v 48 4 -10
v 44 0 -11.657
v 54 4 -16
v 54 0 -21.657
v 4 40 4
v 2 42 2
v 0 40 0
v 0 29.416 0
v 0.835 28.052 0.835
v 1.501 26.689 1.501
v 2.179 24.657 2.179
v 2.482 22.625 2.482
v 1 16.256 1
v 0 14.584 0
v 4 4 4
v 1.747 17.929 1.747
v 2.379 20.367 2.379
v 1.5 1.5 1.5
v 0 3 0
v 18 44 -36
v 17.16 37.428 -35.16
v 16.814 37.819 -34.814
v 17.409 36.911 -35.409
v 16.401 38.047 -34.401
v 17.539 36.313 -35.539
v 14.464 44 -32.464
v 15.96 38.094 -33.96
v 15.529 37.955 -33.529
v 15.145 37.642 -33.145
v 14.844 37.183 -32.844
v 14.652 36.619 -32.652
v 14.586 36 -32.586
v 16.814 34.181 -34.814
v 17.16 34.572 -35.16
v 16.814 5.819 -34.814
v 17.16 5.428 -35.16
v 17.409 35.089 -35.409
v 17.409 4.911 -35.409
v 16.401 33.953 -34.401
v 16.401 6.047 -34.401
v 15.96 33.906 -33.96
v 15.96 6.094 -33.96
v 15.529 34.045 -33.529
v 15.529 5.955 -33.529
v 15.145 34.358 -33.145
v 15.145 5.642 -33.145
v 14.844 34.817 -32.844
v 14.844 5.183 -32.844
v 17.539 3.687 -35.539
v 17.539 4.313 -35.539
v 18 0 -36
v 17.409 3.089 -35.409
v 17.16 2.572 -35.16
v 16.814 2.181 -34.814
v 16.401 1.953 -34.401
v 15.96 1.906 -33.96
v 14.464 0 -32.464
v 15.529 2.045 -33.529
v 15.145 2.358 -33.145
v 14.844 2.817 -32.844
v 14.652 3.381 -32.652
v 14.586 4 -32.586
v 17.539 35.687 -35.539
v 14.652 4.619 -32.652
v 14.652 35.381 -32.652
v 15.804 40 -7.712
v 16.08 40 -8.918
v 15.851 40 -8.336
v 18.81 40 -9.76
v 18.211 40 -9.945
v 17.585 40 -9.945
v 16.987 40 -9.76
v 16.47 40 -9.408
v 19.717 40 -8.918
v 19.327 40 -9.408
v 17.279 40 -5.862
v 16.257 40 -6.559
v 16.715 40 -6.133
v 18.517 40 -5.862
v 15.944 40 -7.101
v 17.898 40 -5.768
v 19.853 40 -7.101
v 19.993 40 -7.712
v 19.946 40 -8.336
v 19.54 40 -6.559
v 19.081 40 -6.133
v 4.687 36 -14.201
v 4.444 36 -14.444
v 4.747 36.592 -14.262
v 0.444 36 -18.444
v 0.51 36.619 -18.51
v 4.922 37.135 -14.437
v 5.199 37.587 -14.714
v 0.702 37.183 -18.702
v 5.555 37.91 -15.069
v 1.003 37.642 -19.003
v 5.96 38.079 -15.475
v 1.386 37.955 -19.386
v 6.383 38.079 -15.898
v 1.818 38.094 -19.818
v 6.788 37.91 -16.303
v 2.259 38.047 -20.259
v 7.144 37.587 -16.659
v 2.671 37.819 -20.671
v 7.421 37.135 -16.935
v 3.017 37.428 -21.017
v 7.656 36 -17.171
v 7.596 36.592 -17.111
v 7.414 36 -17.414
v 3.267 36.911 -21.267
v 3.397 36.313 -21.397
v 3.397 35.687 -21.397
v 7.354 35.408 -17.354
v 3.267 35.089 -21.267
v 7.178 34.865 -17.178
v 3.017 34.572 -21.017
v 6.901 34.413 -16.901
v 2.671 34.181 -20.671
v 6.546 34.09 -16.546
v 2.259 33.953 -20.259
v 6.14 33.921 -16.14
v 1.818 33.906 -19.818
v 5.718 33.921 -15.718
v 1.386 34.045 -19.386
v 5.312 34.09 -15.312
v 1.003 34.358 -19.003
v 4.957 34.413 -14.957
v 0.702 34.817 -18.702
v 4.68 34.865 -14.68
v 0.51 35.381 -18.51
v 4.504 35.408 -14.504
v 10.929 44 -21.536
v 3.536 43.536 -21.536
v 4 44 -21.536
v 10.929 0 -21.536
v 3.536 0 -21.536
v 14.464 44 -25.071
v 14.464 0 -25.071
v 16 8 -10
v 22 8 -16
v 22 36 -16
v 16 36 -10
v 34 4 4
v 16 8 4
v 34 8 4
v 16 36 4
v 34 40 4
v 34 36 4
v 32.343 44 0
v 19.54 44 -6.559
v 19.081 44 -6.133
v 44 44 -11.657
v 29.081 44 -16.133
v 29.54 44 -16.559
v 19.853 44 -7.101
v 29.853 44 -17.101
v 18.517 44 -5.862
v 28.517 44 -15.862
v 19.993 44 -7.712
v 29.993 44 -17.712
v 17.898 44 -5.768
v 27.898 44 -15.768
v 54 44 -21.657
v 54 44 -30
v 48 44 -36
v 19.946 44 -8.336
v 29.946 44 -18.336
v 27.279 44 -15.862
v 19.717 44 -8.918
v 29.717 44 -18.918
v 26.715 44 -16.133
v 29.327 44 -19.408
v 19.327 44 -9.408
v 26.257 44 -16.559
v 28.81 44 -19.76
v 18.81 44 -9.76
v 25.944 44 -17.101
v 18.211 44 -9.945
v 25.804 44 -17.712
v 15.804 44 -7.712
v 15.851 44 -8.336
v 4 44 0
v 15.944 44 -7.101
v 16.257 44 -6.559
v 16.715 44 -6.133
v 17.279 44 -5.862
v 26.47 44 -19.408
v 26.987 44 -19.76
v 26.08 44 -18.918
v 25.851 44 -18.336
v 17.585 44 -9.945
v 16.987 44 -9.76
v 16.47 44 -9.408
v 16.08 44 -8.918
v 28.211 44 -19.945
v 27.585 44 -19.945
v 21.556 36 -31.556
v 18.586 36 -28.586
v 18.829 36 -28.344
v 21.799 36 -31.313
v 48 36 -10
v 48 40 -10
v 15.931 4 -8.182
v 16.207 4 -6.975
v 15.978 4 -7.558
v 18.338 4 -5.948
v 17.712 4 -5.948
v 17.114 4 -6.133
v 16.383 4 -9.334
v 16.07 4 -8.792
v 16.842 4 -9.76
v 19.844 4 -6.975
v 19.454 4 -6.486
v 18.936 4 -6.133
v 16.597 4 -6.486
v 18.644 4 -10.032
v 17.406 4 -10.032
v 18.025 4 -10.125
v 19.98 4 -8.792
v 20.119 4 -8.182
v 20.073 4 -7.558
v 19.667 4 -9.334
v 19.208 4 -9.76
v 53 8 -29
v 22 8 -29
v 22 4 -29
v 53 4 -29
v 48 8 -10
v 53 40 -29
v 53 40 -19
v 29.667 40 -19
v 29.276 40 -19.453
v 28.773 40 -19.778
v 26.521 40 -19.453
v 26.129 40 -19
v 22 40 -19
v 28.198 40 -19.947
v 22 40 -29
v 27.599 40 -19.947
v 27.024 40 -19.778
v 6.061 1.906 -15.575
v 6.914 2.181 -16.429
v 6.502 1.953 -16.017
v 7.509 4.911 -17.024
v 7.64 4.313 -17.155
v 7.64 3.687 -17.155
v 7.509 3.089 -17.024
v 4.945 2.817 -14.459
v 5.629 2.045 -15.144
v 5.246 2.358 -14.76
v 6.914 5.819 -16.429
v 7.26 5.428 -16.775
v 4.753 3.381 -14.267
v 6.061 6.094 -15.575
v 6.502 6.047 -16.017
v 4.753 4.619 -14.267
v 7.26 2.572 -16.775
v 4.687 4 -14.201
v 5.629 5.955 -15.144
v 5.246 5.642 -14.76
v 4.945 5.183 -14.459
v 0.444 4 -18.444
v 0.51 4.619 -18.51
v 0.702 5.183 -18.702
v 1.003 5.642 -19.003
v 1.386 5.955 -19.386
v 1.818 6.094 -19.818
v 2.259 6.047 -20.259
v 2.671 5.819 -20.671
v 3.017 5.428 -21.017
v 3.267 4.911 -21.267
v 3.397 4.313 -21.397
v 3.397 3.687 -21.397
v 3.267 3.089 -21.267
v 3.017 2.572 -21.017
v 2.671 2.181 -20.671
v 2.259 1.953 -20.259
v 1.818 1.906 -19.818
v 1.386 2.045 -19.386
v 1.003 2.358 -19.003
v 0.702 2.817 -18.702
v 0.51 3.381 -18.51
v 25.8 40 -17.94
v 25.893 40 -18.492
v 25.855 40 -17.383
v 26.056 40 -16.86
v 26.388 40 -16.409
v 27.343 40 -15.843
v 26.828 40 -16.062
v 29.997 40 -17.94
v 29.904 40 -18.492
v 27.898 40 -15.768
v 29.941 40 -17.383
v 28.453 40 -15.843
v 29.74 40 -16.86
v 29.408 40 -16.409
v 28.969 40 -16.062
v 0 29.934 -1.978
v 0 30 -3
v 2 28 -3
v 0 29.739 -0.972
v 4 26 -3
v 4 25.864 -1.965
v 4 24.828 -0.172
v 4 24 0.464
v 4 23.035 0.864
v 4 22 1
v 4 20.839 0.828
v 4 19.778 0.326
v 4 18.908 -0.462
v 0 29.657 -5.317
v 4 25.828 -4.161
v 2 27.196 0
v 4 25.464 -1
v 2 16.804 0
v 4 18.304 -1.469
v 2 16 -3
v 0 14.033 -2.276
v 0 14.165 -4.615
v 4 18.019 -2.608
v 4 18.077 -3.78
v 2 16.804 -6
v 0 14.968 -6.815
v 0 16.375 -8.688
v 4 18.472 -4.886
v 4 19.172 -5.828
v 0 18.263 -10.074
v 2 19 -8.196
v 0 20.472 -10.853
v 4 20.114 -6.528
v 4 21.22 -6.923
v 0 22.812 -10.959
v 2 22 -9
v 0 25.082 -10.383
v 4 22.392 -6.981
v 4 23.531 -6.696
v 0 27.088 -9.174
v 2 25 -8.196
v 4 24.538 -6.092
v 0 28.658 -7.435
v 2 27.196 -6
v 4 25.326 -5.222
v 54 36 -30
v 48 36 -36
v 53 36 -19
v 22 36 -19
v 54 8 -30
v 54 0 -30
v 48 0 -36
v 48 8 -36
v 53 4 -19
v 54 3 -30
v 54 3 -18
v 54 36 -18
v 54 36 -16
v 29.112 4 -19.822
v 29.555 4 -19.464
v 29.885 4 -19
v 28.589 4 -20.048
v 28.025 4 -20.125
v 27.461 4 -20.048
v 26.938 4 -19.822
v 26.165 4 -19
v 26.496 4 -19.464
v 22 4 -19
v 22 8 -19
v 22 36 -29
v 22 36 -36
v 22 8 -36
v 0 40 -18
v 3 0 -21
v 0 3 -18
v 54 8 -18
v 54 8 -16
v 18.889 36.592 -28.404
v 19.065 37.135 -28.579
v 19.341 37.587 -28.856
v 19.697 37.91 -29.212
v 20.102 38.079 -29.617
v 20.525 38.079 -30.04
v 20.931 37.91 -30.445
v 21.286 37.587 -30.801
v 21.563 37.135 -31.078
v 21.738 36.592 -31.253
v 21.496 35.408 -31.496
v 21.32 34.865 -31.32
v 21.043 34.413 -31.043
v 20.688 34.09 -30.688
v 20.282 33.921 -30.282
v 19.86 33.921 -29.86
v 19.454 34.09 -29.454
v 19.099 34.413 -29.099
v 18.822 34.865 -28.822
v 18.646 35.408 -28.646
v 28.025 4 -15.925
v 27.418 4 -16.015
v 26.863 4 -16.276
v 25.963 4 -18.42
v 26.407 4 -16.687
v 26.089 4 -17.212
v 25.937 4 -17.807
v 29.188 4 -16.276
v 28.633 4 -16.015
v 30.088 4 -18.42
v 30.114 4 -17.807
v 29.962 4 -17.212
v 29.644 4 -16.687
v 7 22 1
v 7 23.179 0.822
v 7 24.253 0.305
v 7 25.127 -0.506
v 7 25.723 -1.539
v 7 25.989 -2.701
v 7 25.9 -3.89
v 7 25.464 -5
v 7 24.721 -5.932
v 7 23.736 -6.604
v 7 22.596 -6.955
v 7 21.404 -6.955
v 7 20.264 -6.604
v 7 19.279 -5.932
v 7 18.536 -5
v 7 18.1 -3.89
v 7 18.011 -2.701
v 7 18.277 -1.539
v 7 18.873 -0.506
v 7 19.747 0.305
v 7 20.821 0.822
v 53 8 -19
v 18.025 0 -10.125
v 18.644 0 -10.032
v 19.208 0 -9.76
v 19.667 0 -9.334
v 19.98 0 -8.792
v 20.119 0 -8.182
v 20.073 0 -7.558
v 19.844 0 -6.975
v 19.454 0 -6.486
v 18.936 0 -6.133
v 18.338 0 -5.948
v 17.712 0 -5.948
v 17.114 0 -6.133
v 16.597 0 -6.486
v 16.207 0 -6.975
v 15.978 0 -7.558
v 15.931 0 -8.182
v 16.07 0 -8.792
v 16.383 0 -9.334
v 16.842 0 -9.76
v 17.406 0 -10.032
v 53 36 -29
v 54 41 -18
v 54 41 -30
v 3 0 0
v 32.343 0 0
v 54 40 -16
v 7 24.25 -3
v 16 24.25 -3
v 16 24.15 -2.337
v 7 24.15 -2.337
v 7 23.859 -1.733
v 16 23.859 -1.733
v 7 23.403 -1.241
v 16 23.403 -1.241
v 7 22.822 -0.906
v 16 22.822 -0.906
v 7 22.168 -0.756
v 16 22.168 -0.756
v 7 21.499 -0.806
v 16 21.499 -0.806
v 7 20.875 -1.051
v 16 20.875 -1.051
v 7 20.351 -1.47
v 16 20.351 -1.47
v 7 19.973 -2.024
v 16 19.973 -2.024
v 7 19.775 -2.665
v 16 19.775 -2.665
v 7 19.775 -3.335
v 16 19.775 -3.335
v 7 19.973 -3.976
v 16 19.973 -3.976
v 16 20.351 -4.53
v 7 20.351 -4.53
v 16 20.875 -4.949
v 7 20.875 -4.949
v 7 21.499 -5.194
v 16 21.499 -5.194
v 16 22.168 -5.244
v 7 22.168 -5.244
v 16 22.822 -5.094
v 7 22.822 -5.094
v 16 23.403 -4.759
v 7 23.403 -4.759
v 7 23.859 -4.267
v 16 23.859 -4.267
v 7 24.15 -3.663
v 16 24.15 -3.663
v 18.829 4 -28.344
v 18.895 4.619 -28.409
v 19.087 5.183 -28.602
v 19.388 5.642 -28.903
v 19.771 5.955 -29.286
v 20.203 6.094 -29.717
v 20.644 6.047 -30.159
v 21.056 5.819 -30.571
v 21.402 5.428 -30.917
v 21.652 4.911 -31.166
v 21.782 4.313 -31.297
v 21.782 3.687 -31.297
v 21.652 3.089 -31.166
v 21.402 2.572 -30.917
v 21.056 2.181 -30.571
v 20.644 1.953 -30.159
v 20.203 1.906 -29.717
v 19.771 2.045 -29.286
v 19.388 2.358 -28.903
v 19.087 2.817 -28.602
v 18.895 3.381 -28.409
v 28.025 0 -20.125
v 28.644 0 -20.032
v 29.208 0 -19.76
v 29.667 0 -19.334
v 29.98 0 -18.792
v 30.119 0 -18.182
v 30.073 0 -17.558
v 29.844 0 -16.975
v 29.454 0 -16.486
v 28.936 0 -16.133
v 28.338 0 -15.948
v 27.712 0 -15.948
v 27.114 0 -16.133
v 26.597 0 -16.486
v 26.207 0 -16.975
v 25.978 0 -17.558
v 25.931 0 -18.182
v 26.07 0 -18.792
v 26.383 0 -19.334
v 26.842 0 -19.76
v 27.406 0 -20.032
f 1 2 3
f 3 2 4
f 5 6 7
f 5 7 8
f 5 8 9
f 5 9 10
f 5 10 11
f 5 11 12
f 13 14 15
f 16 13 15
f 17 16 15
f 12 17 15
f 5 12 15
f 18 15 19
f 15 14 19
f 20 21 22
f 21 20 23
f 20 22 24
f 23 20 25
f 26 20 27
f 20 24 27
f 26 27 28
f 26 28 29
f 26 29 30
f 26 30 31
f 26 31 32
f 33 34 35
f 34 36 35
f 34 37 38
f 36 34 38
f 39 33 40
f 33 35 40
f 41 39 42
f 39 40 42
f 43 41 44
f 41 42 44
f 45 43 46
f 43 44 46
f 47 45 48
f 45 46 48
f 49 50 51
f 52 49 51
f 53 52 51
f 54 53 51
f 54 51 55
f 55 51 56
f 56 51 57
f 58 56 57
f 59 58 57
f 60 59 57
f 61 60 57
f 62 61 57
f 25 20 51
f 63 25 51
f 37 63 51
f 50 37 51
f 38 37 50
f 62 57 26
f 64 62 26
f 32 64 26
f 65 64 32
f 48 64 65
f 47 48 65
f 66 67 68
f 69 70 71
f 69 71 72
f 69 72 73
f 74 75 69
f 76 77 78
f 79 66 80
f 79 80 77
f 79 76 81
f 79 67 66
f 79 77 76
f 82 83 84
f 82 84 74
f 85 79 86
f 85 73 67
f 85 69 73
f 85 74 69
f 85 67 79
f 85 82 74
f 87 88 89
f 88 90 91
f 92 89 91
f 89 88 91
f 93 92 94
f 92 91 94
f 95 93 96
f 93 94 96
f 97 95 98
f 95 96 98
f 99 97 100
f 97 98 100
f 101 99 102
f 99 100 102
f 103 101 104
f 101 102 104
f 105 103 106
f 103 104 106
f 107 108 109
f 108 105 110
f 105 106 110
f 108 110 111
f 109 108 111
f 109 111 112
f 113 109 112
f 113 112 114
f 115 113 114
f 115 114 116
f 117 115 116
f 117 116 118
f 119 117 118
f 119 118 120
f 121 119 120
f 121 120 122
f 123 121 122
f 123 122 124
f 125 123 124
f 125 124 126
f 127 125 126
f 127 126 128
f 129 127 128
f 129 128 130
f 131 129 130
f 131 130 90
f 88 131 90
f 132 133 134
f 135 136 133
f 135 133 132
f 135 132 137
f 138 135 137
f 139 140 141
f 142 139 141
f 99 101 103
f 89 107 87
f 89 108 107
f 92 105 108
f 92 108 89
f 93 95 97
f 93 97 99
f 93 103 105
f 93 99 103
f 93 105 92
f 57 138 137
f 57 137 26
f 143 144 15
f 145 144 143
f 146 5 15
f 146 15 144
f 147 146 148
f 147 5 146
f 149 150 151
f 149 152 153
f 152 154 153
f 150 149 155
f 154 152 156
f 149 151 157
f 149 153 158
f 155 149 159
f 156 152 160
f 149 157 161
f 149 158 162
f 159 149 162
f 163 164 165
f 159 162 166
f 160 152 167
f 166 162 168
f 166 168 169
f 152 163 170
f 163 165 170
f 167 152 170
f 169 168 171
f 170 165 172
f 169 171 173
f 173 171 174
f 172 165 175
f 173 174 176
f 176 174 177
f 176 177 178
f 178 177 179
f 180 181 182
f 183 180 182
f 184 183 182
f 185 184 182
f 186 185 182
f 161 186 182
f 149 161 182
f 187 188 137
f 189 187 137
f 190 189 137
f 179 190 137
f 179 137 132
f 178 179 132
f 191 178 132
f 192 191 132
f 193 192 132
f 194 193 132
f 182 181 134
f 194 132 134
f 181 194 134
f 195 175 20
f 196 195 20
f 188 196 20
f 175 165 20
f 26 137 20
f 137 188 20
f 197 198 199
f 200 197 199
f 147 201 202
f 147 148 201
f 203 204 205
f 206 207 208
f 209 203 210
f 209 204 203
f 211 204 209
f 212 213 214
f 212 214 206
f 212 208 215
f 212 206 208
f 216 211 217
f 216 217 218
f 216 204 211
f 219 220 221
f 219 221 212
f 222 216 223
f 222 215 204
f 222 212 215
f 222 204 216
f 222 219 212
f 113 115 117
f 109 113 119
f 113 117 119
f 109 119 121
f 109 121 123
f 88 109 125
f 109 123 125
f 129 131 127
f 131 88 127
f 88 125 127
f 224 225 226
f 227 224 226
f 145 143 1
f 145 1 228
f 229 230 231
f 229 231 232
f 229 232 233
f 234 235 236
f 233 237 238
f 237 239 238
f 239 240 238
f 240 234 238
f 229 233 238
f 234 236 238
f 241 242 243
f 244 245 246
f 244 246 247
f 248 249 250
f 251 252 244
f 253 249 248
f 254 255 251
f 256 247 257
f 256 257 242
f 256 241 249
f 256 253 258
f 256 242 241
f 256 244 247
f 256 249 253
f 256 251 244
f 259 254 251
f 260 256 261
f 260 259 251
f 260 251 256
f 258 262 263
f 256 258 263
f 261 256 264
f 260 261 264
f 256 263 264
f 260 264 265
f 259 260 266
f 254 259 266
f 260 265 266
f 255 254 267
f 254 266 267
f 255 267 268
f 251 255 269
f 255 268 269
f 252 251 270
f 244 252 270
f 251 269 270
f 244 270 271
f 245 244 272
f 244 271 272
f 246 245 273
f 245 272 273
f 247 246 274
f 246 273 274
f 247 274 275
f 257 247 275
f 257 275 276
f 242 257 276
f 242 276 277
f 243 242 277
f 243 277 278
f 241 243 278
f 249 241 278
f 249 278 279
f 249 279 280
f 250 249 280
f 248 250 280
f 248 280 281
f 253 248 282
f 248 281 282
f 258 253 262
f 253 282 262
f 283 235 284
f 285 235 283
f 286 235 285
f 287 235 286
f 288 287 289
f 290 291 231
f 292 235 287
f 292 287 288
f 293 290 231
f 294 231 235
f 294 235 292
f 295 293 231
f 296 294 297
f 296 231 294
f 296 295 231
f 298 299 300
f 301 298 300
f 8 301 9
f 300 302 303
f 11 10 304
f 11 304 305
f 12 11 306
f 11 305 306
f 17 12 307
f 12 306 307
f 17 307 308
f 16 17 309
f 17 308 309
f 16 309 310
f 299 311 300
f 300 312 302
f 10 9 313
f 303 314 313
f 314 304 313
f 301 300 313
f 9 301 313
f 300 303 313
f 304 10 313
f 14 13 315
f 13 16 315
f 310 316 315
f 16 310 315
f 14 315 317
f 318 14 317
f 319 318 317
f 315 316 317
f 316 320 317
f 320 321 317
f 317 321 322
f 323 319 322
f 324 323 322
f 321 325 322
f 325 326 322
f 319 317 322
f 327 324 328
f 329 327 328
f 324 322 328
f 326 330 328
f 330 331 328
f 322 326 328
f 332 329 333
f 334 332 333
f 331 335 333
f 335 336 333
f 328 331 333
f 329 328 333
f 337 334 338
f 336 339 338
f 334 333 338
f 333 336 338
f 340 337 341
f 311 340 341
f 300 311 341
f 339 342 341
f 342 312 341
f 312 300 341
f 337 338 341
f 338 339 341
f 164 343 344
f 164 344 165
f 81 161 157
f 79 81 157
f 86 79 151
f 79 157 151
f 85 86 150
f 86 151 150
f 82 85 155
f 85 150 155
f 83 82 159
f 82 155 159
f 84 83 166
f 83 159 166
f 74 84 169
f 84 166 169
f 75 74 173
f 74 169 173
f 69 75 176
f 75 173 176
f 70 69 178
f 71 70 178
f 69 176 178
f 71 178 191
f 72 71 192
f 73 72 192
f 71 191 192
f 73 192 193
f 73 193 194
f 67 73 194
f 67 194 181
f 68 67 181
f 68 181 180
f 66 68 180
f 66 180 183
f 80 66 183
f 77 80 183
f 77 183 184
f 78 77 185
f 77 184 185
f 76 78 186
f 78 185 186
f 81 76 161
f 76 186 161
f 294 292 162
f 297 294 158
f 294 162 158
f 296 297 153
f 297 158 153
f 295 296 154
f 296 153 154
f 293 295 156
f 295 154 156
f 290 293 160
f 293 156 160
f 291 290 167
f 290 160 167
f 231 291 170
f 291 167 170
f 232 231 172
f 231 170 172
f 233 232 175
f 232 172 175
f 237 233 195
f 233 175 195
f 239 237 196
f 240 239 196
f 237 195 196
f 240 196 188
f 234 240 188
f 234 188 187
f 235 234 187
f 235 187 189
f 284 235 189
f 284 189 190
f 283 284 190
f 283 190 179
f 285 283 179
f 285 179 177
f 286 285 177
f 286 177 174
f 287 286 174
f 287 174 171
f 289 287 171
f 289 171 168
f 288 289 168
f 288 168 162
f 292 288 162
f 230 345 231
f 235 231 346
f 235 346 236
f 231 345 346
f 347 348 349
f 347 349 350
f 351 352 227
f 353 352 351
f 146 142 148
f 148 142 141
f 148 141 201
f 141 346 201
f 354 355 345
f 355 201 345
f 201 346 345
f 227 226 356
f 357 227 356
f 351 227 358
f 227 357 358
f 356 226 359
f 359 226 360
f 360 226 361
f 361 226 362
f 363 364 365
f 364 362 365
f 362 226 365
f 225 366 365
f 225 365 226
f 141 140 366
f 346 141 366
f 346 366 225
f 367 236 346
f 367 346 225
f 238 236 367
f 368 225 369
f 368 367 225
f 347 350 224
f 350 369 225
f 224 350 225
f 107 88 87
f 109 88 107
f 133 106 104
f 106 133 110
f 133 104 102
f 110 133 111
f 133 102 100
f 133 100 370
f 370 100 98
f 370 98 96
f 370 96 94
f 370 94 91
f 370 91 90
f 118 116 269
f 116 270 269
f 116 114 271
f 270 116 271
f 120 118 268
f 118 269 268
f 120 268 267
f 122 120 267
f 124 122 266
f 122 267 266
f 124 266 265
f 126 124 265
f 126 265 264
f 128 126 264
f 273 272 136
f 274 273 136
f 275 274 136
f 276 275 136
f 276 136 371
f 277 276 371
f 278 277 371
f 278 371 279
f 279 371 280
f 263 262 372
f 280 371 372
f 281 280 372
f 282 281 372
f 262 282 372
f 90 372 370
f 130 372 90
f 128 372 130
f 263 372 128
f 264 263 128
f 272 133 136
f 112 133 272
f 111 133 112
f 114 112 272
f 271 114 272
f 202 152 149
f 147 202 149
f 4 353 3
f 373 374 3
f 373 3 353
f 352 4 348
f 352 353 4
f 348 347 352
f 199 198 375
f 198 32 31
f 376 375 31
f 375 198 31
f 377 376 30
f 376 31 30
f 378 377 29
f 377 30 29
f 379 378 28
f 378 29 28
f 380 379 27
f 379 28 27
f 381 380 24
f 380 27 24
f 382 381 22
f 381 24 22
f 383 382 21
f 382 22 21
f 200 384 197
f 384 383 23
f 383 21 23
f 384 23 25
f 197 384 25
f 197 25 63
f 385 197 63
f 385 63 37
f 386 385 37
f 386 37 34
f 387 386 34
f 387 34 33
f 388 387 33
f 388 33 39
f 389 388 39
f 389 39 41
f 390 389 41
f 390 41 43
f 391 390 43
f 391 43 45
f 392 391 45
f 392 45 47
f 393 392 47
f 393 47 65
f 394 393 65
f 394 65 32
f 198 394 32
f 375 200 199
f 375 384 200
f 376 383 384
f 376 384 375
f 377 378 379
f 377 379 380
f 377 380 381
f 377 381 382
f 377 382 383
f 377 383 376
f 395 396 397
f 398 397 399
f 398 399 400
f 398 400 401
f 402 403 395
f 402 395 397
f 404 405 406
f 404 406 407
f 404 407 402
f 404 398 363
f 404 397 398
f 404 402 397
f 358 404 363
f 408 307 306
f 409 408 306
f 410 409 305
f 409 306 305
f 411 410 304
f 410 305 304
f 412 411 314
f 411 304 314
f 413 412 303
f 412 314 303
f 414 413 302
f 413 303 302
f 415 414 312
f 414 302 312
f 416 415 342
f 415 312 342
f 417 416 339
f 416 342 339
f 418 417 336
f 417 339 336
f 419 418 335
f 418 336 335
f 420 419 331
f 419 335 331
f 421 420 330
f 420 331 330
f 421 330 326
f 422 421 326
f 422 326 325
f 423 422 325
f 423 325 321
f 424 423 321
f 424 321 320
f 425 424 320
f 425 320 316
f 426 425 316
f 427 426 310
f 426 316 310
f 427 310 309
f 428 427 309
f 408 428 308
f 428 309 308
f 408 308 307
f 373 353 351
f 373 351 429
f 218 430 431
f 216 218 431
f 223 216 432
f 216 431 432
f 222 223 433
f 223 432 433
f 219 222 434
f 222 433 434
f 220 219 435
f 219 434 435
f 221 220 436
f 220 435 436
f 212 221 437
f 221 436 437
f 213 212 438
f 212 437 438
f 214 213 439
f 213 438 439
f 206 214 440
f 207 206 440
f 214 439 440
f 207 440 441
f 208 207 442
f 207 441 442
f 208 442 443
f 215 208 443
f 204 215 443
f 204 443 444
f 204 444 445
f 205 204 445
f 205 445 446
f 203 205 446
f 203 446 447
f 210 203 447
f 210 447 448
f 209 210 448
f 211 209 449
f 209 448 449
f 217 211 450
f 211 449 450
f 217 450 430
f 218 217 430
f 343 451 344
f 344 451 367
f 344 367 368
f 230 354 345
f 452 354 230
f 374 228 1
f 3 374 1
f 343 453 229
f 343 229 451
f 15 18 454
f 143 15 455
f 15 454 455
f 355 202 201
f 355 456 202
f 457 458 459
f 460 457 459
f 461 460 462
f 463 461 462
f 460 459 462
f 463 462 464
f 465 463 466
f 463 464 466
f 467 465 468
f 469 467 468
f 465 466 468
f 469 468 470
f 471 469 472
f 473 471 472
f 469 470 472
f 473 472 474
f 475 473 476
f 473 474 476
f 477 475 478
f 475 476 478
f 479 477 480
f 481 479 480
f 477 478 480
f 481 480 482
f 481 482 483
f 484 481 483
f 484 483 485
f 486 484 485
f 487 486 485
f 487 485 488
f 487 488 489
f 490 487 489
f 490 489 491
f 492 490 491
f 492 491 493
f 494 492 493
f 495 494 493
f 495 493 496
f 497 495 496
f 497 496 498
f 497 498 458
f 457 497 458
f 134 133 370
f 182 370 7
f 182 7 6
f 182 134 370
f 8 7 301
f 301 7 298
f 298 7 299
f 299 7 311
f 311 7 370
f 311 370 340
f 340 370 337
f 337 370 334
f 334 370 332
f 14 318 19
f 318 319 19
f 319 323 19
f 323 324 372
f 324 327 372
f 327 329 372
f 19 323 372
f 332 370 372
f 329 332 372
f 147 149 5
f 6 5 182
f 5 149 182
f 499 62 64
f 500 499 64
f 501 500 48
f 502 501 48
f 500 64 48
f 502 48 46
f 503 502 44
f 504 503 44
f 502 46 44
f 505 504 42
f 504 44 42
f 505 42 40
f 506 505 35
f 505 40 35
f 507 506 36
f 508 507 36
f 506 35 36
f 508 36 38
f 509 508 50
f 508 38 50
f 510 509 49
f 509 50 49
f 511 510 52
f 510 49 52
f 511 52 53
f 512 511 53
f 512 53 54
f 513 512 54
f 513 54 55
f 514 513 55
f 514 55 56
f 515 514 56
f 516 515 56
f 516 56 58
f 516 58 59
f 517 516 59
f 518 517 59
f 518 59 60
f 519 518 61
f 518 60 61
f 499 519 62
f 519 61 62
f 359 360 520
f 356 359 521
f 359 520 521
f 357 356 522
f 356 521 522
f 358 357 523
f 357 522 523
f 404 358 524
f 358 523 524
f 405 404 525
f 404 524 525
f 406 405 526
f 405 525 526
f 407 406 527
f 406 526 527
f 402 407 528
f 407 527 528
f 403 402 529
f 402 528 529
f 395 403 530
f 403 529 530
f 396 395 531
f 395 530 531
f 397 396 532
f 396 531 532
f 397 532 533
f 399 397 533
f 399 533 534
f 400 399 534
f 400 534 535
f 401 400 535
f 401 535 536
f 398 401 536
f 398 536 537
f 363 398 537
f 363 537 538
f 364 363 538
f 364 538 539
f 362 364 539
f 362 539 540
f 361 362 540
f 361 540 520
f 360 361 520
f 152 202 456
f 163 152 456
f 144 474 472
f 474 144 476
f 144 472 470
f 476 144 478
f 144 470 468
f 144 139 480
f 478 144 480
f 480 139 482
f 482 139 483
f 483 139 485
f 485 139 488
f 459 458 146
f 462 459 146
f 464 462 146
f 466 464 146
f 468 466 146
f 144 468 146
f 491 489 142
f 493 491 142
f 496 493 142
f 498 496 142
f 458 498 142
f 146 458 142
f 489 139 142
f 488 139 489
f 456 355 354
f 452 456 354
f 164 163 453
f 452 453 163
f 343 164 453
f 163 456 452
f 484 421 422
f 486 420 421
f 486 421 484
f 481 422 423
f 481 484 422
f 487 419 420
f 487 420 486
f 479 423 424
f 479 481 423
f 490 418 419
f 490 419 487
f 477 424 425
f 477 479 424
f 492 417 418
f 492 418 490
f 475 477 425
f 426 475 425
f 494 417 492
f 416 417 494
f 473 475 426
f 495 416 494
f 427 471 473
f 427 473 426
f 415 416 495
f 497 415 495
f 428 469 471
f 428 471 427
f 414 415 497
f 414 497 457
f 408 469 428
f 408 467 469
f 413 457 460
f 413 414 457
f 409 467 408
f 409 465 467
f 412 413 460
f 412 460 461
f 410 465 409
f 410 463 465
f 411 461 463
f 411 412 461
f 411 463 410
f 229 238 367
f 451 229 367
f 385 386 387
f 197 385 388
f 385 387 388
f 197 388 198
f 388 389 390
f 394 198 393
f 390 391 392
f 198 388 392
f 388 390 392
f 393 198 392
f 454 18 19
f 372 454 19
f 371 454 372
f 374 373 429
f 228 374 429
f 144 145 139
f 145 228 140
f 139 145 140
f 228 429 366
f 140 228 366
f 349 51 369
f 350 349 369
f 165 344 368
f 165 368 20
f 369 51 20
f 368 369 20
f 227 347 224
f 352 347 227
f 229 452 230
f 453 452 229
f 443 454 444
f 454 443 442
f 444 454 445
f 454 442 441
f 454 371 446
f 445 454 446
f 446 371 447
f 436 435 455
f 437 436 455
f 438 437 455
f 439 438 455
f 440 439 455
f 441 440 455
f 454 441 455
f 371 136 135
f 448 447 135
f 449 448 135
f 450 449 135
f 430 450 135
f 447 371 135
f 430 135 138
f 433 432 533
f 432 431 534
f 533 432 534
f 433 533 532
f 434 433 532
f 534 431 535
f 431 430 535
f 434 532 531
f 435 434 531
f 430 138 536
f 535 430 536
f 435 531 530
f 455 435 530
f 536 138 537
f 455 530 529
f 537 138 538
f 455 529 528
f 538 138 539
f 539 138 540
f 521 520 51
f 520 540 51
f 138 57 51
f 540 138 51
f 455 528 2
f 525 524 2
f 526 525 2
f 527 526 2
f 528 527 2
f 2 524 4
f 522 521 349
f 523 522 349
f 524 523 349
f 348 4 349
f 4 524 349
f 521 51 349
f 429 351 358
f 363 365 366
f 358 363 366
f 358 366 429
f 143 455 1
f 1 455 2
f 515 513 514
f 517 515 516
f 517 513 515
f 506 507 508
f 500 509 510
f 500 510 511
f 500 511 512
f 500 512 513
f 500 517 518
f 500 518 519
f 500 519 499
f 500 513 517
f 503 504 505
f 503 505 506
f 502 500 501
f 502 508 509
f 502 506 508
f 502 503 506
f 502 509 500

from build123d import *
from build123d.topology import SkipClean

# Parameters (mm, degrees)
SKETCH9_W            = 36
SKETCH9_H            = 36
BOSS_EXTRUDE1_DEPTH  = 40
CHAMFER2_SIZE        = 18
SKETCH10_W           = 36
SKETCH10_H           = 40
BOSS_EXTRUDE2_DEPTH  = 8
SKETCH12_W           = 44
SKETCH12_H           = 40
BOSS_EXTRUDE3_DEPTH  = 8
CHAMFER3_SIZE        = 18
CHAMFER4_SIZE        = 6
SKETCH13_W           = 36.769552622
SKETCH13_H           = 20
CUT_EXTRUDE6_DEPTH   = 39.59798
SKETCH22_R           = 2.1
CUT_EXTRUDE13_DEPTH  = 6
BOSS_EXTRUDE7_DEPTH  = 8
BOSS_EXTRUDE8_DEPTH  = 12
BOSS_EXTRUDE9_DEPTH  = 4
CUT_EXTRUDE14_DEPTH  = 4
CUT_EXTRUDE15_DEPTH  = 4
SKETCH28_W           = 4
SKETCH28_H           = 28
CUT_EXTRUDE16_DEPTH  = 77.210235533
BOSS_EXTRUDE11_DEPTH = 28
SKETCH31_W           = 10
SKETCH31_H           = 36
CUT_EXTRUDE17_DEPTH  = 22
SKETCH32_W           = 44
SKETCH32_H           = 18.026894841
CUT_EXTRUDE18_DEPTH  = 72.888803022
BOSS_EXTRUDE12_DEPTH = 10
BOSS_EXTRUDE13_DEPTH = 10
CHAMFER5_SIZE        = 6
CUT_EXTRUDE19_DEPTH  = 79.409183136
CHAMFER6_SIZE        = 6
SKETCH37_R           = 2.8
CUT_EXTRUDE20_DEPTH  = 7
BOSS_EXTRUDE14_DEPTH = 14
CHAMFER7_SIZE        = 14
CHAMFER8_SIZE        = 4
BOSS_EXTRUDE15_START = 7
SKETCH41_R           = 2.8
BOSS_EXTRUDE15_DEPTH = 7
BOSS_EXTRUDE16_START = 7
SKETCH42_R           = 2.8
BOSS_EXTRUDE16_DEPTH = 7
CHAMFER9_SIZE        = 1
SKETCH43_R           = 2.25
CUT_EXTRUDE21_DEPTH  = 69.381283989
SKETCH44_R           = 4
CUT_EXTRUDE22_DEPTH  = 7
CHAMFER11_SIZE       = 4
CHAMFER12_SIZE       = 3
SKETCH48_R           = 2.1
CUT_EXTRUDE26_DEPTH  = 4
SKETCH49_R           = 2.1
CUT_EXTRUDE27_DEPTH  = 4
CUT_EXTRUDE28_DEPTH  = 79.409183136


with BuildPart() as part:
    # Sketch9 → Boss-Extrude1 (new body)
    with BuildSketch(Plane(origin=(0, 0, 0), x_dir=(1, 0, 0), z_dir=(0, 1, 0))):
        with Locations((18, 18)):
            Rectangle(SKETCH9_W, SKETCH9_H)
    extrude(amount=BOSS_EXTRUDE1_DEPTH)

    # Chamfer2
    chamfer2_edges = [part.edges().sort_by_distance(p)[0] for p in [
        (0, 20, -36),
    ]]
    chamfer(chamfer2_edges, length=CHAMFER2_SIZE)

    # Sketch10 → Boss-Extrude2 (add)
    with BuildSketch(Plane(origin=(36, 0, 0), x_dir=(0, 0, -1), z_dir=(1, 0, 0))):
        with Locations((18, 20)):
            Rectangle(SKETCH10_W, SKETCH10_H)
    extrude(amount=BOSS_EXTRUDE2_DEPTH)

    # Sketch12 → Boss-Extrude3 (add)
    with BuildSketch(Plane.XY):
        with Locations((22, 20)):
            Rectangle(SKETCH12_W, SKETCH12_H)
    extrude(amount=BOSS_EXTRUDE3_DEPTH)

    # Chamfer3
    chamfer3_edges = [part.edges().sort_by_distance(p)[0] for p in [
        (44, 20, -36),
        (0, 20, 8),
    ]]
    chamfer(chamfer3_edges, length=CHAMFER3_SIZE)

    # Chamfer4
    chamfer4_edges = [part.edges().sort_by_distance(p)[0] for p in [
        (44, 20, 8),
    ]]
    chamfer(chamfer4_edges, length=CHAMFER4_SIZE)

    # Sketch13 → Cut-Extrude6 (cut)
    with BuildSketch(Plane(origin=(23, 0, 23), x_dir=(0.7071067811865465, 0, -0.7071067811865487), z_dir=(0.7071067811865487, 0, 0.7071067811865465))):
        with Locations((25.455844123, 22)):
            Rectangle(SKETCH13_W, SKETCH13_H)
    extrude(amount=-CUT_EXTRUDE6_DEPTH, mode=Mode.SUBTRACT)

    # Sketch22 → Cut-Extrude13 (cut)
    with BuildSketch(Plane(origin=(-9, 0, -9), x_dir=(-0.7071067811865487, 0, 0.7071067811865465), z_dir=(-0.7071067811865465, 0, -0.7071067811865487))):
        with Locations((-15.455844123, 36)):
            Circle(SKETCH22_R)
        with Locations((-35.455844123, 36)):
            Circle(SKETCH22_R)
        with Locations((-35.455844123, 4)):
            Circle(SKETCH22_R)
        with Locations((-15.455844123, 4)):
            Circle(SKETCH22_R)
    extrude(amount=-CUT_EXTRUDE13_DEPTH, mode=Mode.SUBTRACT)

    # Sketch23 → Boss-Extrude7 (add)
    with BuildSketch(Plane(origin=(0, 40, 0), x_dir=(1, 0, 0), z_dir=(0, 1, 0))):
        Polygon((26, 36), (44, 36), (44, 18), align=None)
    extrude(amount=-BOSS_EXTRUDE7_DEPTH)

    # Sketch24 → Boss-Extrude8 (add)
    with BuildSketch(Plane(origin=(0, 0, 0), x_dir=(-1, 0, 0), z_dir=(0, -1, 0))):
        Polygon((-44, 18), (-26, 36), (-44, 36), align=None)
    extrude(amount=-BOSS_EXTRUDE8_DEPTH)

    # Sketch25 → Boss-Extrude9 (add)
    with BuildSketch(Plane(origin=(0, 40, 0), x_dir=(1, 0, 0), z_dir=(0, 1, 0))):
        Polygon((18, -8), (38, -8), (44, -2), (44, 36), (18, 36), (0, 18), (0, 10), align=None)
    extrude(amount=BOSS_EXTRUDE9_DEPTH)

    # Sketch26 → Cut-Extrude14 (cut)
    with SkipClean():  # the faces are left unmerged after this step: merging them gives an invalid solid
        with BuildSketch(Plane(origin=(0, 32, 0), x_dir=(-1, 0, 0), z_dir=(0, -1, 0))):
            Polygon((-44, 36), (-44, -2), (-38, -8), (-18, -8), (0, 10), (-26, 36), align=None)
        extrude(amount=-CUT_EXTRUDE14_DEPTH, mode=Mode.SUBTRACT)

    # Sketch27 → Cut-Extrude15 (cut)
    with BuildSketch(Plane(origin=(0, 12, 0), x_dir=(1, 0, 0), z_dir=(0, 1, 0))):
        Polygon((44, -2), (44, 36), (26, 36), (0, 10), (18, -8), (38, -8), align=None)
    extrude(amount=-CUT_EXTRUDE15_DEPTH, mode=Mode.SUBTRACT)

    # Sketch28 → Cut-Extrude16 (cut, through all)
    with BuildSketch(Plane(origin=(0, 0, -36), x_dir=(-1, 0, 0), z_dir=(0, 0, -1))):
        with Locations((-24, 22)):
            Rectangle(SKETCH28_W, SKETCH28_H)
    extrude(amount=-CUT_EXTRUDE16_DEPTH, mode=Mode.SUBTRACT)

    # Sketch30 → Boss-Extrude11 (add)
    with BuildSketch(Plane(origin=(0, 8, 0), x_dir=(1, 0, 0), z_dir=(0, 1, 0))):
        Polygon((0, 10), (22, 10), (22, 32), align=None)
    extrude(amount=BOSS_EXTRUDE11_DEPTH)

    # Sketch31 → Cut-Extrude17 (cut)
    with BuildSketch(Plane(origin=(44, 0, 0), x_dir=(0, 0, -1), z_dir=(1, 0, 0))):
        with Locations((24, 22)):
            Rectangle(SKETCH31_W, SKETCH31_H)
    extrude(amount=-CUT_EXTRUDE17_DEPTH, mode=Mode.SUBTRACT)

    # Sketch32 → Cut-Extrude18 (cut, through all)
    with BuildSketch(Plane(origin=(0, 0, 0), x_dir=(-1, 0, 0), z_dir=(0, -1, 0))):
        with Locations((-22, 0.986552579)):
            Rectangle(SKETCH32_W, SKETCH32_H)
    extrude(amount=-CUT_EXTRUDE18_DEPTH, mode=Mode.SUBTRACT)

    # Sketch33 → Boss-Extrude12 (add)
    with BuildSketch(Plane(origin=(44, 0, 0), x_dir=(0, 0, -1), z_dir=(1, 0, 0))):
        Polygon((10, 8), (10, 0), (36, 0), (36, 8), (29, 8), (29, 4), (19, 4), (19, 8), align=None)
    extrude(amount=BOSS_EXTRUDE12_DEPTH)

    # Sketch35 → Boss-Extrude13 (add)
    with BuildSketch(Plane(origin=(44, 0, 0), x_dir=(0, 0, -1), z_dir=(1, 0, 0))):
        Polygon((10, 44), (10, 36), (19, 36), (19, 40), (29, 40), (29, 36), (36, 36), (36, 44), align=None)
    extrude(amount=BOSS_EXTRUDE13_DEPTH)

    # Chamfer5
    chamfer5_edges = [part.edges().sort_by_distance(p)[0] for p in [
        (54, 4, -10),
        (54, 4, -36),
        (54, 40, -10),
        (54, 40, -36),
    ]]
    chamfer(chamfer5_edges, length=CHAMFER5_SIZE)

    # Sketch36 → Cut-Extrude19 (cut, through all)
    with BuildSketch(Plane(origin=(0, 44, 0), x_dir=(1, 0, 0), z_dir=(0, 1, 0))):
        Polygon((14, 32), (14, 26), (10, 22), (4, 22), align=None)
    extrude(amount=-CUT_EXTRUDE19_DEPTH, mode=Mode.SUBTRACT)

    # Chamfer6
    chamfer6_edges = [part.edges().sort_by_distance(p)[0] for p in [
        (22, 22, -10),
    ]]
    chamfer(chamfer6_edges, length=CHAMFER6_SIZE)

    # Sketch37 → Cut-Extrude20 (cut)
    with BuildSketch(Plane(origin=(22, 0, 0), x_dir=(0, 0, -1), z_dir=(1, 0, 0))):
        with Locations(Location((24, 31, 0), (0, 0, 90))):
            Circle(SKETCH37_R)
        with Locations(Location((24, 13, 0), (0, 0, 90))):
            Circle(SKETCH37_R)
    extrude(amount=-CUT_EXTRUDE20_DEPTH, mode=Mode.SUBTRACT)

    # Sketch39 → Boss-Extrude14 (add)
    with BuildSketch(Plane.XY.offset(-10)):
        Polygon((48, 8), (16, 8), (16, 36), (48, 36), (48, 44), (0, 44), (0, 0), (48, 0), align=None)
    extrude(amount=BOSS_EXTRUDE14_DEPTH)

    # Chamfer7
    chamfer7_edges = [part.edges().sort_by_distance(p)[0] for p in [
        (48, 4, 4),
        (48, 40, 4),
    ]]
    chamfer(chamfer7_edges, length=CHAMFER7_SIZE - 0.0001)  # a hair under: the kernel refuses the full size

    # Chamfer8
    chamfer8_edges = [part.edges().sort_by_distance(p)[0] for p in [
        (17.00005, 0, 4),
        (0, 22, 4),
        (17.00005, 44, 4),
        (41.00005, 0, -2.99995),
        (48, 0, -9.99995),
        (51, 0, -13),
        (41.00005, 44, -2.99995),
        (48, 44, -9.99995),
        (51, 44, -13),
    ]]
    chamfer(chamfer8_edges, length=CHAMFER8_SIZE)

    # Sketch41 → Boss-Extrude15 (add)
    with BuildSketch(Plane(origin=(15, 0, 0), x_dir=(0, 0, -1), z_dir=(1, 0, 0)).offset(BOSS_EXTRUDE15_START)):
        with Locations((24, 31)):
            Circle(SKETCH41_R)
    extrude(amount=-BOSS_EXTRUDE15_DEPTH)

    # Sketch42 → Boss-Extrude16 (add)
    with BuildSketch(Plane(origin=(15, 0, 0), x_dir=(0, 0, -1), z_dir=(1, 0, 0)).offset(BOSS_EXTRUDE16_START)):
        with Locations((24, 13)):
            Circle(SKETCH42_R)
    extrude(amount=-BOSS_EXTRUDE16_DEPTH)

    # Chamfer9
    chamfer9_edges = [part.edges().sort_by_distance(p)[0] for p in [
        (54, 6, -29),
        (54, 4, -24),
        (54, 6, -19),
        (54, 38, -19),
        (54, 40, -24),
        (54, 38, -29),
    ]]
    chamfer(chamfer9_edges, length=CHAMFER9_SIZE - 0.0001)  # a hair under: the kernel refuses the full size

    # Sketch43 → Cut-Extrude21 (cut, through all)
    with BuildSketch(Plane(origin=(16, 0, 0), x_dir=(0, 0, -1), z_dir=(1, 0, 0))):
        with Locations(Location((3, 22, 0), (0, 0, 90))):
            Circle(SKETCH43_R)
    extrude(amount=-CUT_EXTRUDE21_DEPTH, mode=Mode.SUBTRACT)

    # Sketch44 → Cut-Extrude22 (cut)
    with BuildSketch(Plane.ZY):
        with Locations((-3, 22)):
            Circle(SKETCH44_R)
    extrude(amount=-CUT_EXTRUDE22_DEPTH, mode=Mode.SUBTRACT)

    # Chamfer10: read off the stored shape, not the designer's step
    # Chamfer10 outline → Chamfer10 (revolve, cut)
    with BuildSketch(Plane(origin=(0, 22, -3), x_dir=(0, 1, 0), z_dir=(0, 0, -1))):
        Polygon((8, 0), (4, 4), (4, 0), align=None)
    revolve(axis=Axis((0, 22, -3), (1, 0, 0)), mode=Mode.SUBTRACT)

    # Chamfer11
    chamfer11_edges = [part.edges().sort_by_distance(p)[0] for p in [
        (0, 44, -9),
    ]]
    chamfer(chamfer11_edges, length=CHAMFER11_SIZE)

    # Chamfer12
    chamfer12_edges = [part.edges().sort_by_distance(p)[0] for p in [
        (0, 0, -9),
    ]]
    chamfer(chamfer12_edges, length=CHAMFER12_SIZE)

    # Sketch48 → Cut-Extrude26 (cut)
    with BuildSketch(Plane(origin=(0, 0, 0), x_dir=(-1, 0, 0), z_dir=(0, -1, 0))):
        with Locations(Location((-28.025270862, 18.024920623, 0), (0, 0, 90))):
            Circle(SKETCH48_R)
        with Locations(Location((-18.025270862, 8.024920623, 0), (0, 0, 90))):
            Circle(SKETCH48_R)
    extrude(amount=-CUT_EXTRUDE26_DEPTH, mode=Mode.SUBTRACT)

    # Sketch49 → Cut-Extrude27 (cut)
    with BuildSketch(Plane(origin=(0, 44, 0), x_dir=(1, 0, 0), z_dir=(0, 1, 0))):
        with Locations(Location((17.898400733, 7.868441876, 0), (0, 0, 270))):
            Circle(SKETCH49_R)
        with Locations(Location((27.898400733, 17.868441876, 0), (0, 0, 270))):
            Circle(SKETCH49_R)
    extrude(amount=-CUT_EXTRUDE27_DEPTH, mode=Mode.SUBTRACT)

    # Sketch50 → Cut-Extrude28 (cut, through all)
    with BuildSketch(Plane(origin=(0, 0, 0), x_dir=(-1, 0, 0), z_dir=(0, -1, 0))):
        Polygon((-3.535533906, 21.535533906), (-10.928932188, 21.535533906), (-14.464466094, 25.071067812), (-14.464466094, 32.464466094), align=None)
    extrude(amount=-CUT_EXTRUDE28_DEPTH, mode=Mode.SUBTRACT)


solid = part.part
